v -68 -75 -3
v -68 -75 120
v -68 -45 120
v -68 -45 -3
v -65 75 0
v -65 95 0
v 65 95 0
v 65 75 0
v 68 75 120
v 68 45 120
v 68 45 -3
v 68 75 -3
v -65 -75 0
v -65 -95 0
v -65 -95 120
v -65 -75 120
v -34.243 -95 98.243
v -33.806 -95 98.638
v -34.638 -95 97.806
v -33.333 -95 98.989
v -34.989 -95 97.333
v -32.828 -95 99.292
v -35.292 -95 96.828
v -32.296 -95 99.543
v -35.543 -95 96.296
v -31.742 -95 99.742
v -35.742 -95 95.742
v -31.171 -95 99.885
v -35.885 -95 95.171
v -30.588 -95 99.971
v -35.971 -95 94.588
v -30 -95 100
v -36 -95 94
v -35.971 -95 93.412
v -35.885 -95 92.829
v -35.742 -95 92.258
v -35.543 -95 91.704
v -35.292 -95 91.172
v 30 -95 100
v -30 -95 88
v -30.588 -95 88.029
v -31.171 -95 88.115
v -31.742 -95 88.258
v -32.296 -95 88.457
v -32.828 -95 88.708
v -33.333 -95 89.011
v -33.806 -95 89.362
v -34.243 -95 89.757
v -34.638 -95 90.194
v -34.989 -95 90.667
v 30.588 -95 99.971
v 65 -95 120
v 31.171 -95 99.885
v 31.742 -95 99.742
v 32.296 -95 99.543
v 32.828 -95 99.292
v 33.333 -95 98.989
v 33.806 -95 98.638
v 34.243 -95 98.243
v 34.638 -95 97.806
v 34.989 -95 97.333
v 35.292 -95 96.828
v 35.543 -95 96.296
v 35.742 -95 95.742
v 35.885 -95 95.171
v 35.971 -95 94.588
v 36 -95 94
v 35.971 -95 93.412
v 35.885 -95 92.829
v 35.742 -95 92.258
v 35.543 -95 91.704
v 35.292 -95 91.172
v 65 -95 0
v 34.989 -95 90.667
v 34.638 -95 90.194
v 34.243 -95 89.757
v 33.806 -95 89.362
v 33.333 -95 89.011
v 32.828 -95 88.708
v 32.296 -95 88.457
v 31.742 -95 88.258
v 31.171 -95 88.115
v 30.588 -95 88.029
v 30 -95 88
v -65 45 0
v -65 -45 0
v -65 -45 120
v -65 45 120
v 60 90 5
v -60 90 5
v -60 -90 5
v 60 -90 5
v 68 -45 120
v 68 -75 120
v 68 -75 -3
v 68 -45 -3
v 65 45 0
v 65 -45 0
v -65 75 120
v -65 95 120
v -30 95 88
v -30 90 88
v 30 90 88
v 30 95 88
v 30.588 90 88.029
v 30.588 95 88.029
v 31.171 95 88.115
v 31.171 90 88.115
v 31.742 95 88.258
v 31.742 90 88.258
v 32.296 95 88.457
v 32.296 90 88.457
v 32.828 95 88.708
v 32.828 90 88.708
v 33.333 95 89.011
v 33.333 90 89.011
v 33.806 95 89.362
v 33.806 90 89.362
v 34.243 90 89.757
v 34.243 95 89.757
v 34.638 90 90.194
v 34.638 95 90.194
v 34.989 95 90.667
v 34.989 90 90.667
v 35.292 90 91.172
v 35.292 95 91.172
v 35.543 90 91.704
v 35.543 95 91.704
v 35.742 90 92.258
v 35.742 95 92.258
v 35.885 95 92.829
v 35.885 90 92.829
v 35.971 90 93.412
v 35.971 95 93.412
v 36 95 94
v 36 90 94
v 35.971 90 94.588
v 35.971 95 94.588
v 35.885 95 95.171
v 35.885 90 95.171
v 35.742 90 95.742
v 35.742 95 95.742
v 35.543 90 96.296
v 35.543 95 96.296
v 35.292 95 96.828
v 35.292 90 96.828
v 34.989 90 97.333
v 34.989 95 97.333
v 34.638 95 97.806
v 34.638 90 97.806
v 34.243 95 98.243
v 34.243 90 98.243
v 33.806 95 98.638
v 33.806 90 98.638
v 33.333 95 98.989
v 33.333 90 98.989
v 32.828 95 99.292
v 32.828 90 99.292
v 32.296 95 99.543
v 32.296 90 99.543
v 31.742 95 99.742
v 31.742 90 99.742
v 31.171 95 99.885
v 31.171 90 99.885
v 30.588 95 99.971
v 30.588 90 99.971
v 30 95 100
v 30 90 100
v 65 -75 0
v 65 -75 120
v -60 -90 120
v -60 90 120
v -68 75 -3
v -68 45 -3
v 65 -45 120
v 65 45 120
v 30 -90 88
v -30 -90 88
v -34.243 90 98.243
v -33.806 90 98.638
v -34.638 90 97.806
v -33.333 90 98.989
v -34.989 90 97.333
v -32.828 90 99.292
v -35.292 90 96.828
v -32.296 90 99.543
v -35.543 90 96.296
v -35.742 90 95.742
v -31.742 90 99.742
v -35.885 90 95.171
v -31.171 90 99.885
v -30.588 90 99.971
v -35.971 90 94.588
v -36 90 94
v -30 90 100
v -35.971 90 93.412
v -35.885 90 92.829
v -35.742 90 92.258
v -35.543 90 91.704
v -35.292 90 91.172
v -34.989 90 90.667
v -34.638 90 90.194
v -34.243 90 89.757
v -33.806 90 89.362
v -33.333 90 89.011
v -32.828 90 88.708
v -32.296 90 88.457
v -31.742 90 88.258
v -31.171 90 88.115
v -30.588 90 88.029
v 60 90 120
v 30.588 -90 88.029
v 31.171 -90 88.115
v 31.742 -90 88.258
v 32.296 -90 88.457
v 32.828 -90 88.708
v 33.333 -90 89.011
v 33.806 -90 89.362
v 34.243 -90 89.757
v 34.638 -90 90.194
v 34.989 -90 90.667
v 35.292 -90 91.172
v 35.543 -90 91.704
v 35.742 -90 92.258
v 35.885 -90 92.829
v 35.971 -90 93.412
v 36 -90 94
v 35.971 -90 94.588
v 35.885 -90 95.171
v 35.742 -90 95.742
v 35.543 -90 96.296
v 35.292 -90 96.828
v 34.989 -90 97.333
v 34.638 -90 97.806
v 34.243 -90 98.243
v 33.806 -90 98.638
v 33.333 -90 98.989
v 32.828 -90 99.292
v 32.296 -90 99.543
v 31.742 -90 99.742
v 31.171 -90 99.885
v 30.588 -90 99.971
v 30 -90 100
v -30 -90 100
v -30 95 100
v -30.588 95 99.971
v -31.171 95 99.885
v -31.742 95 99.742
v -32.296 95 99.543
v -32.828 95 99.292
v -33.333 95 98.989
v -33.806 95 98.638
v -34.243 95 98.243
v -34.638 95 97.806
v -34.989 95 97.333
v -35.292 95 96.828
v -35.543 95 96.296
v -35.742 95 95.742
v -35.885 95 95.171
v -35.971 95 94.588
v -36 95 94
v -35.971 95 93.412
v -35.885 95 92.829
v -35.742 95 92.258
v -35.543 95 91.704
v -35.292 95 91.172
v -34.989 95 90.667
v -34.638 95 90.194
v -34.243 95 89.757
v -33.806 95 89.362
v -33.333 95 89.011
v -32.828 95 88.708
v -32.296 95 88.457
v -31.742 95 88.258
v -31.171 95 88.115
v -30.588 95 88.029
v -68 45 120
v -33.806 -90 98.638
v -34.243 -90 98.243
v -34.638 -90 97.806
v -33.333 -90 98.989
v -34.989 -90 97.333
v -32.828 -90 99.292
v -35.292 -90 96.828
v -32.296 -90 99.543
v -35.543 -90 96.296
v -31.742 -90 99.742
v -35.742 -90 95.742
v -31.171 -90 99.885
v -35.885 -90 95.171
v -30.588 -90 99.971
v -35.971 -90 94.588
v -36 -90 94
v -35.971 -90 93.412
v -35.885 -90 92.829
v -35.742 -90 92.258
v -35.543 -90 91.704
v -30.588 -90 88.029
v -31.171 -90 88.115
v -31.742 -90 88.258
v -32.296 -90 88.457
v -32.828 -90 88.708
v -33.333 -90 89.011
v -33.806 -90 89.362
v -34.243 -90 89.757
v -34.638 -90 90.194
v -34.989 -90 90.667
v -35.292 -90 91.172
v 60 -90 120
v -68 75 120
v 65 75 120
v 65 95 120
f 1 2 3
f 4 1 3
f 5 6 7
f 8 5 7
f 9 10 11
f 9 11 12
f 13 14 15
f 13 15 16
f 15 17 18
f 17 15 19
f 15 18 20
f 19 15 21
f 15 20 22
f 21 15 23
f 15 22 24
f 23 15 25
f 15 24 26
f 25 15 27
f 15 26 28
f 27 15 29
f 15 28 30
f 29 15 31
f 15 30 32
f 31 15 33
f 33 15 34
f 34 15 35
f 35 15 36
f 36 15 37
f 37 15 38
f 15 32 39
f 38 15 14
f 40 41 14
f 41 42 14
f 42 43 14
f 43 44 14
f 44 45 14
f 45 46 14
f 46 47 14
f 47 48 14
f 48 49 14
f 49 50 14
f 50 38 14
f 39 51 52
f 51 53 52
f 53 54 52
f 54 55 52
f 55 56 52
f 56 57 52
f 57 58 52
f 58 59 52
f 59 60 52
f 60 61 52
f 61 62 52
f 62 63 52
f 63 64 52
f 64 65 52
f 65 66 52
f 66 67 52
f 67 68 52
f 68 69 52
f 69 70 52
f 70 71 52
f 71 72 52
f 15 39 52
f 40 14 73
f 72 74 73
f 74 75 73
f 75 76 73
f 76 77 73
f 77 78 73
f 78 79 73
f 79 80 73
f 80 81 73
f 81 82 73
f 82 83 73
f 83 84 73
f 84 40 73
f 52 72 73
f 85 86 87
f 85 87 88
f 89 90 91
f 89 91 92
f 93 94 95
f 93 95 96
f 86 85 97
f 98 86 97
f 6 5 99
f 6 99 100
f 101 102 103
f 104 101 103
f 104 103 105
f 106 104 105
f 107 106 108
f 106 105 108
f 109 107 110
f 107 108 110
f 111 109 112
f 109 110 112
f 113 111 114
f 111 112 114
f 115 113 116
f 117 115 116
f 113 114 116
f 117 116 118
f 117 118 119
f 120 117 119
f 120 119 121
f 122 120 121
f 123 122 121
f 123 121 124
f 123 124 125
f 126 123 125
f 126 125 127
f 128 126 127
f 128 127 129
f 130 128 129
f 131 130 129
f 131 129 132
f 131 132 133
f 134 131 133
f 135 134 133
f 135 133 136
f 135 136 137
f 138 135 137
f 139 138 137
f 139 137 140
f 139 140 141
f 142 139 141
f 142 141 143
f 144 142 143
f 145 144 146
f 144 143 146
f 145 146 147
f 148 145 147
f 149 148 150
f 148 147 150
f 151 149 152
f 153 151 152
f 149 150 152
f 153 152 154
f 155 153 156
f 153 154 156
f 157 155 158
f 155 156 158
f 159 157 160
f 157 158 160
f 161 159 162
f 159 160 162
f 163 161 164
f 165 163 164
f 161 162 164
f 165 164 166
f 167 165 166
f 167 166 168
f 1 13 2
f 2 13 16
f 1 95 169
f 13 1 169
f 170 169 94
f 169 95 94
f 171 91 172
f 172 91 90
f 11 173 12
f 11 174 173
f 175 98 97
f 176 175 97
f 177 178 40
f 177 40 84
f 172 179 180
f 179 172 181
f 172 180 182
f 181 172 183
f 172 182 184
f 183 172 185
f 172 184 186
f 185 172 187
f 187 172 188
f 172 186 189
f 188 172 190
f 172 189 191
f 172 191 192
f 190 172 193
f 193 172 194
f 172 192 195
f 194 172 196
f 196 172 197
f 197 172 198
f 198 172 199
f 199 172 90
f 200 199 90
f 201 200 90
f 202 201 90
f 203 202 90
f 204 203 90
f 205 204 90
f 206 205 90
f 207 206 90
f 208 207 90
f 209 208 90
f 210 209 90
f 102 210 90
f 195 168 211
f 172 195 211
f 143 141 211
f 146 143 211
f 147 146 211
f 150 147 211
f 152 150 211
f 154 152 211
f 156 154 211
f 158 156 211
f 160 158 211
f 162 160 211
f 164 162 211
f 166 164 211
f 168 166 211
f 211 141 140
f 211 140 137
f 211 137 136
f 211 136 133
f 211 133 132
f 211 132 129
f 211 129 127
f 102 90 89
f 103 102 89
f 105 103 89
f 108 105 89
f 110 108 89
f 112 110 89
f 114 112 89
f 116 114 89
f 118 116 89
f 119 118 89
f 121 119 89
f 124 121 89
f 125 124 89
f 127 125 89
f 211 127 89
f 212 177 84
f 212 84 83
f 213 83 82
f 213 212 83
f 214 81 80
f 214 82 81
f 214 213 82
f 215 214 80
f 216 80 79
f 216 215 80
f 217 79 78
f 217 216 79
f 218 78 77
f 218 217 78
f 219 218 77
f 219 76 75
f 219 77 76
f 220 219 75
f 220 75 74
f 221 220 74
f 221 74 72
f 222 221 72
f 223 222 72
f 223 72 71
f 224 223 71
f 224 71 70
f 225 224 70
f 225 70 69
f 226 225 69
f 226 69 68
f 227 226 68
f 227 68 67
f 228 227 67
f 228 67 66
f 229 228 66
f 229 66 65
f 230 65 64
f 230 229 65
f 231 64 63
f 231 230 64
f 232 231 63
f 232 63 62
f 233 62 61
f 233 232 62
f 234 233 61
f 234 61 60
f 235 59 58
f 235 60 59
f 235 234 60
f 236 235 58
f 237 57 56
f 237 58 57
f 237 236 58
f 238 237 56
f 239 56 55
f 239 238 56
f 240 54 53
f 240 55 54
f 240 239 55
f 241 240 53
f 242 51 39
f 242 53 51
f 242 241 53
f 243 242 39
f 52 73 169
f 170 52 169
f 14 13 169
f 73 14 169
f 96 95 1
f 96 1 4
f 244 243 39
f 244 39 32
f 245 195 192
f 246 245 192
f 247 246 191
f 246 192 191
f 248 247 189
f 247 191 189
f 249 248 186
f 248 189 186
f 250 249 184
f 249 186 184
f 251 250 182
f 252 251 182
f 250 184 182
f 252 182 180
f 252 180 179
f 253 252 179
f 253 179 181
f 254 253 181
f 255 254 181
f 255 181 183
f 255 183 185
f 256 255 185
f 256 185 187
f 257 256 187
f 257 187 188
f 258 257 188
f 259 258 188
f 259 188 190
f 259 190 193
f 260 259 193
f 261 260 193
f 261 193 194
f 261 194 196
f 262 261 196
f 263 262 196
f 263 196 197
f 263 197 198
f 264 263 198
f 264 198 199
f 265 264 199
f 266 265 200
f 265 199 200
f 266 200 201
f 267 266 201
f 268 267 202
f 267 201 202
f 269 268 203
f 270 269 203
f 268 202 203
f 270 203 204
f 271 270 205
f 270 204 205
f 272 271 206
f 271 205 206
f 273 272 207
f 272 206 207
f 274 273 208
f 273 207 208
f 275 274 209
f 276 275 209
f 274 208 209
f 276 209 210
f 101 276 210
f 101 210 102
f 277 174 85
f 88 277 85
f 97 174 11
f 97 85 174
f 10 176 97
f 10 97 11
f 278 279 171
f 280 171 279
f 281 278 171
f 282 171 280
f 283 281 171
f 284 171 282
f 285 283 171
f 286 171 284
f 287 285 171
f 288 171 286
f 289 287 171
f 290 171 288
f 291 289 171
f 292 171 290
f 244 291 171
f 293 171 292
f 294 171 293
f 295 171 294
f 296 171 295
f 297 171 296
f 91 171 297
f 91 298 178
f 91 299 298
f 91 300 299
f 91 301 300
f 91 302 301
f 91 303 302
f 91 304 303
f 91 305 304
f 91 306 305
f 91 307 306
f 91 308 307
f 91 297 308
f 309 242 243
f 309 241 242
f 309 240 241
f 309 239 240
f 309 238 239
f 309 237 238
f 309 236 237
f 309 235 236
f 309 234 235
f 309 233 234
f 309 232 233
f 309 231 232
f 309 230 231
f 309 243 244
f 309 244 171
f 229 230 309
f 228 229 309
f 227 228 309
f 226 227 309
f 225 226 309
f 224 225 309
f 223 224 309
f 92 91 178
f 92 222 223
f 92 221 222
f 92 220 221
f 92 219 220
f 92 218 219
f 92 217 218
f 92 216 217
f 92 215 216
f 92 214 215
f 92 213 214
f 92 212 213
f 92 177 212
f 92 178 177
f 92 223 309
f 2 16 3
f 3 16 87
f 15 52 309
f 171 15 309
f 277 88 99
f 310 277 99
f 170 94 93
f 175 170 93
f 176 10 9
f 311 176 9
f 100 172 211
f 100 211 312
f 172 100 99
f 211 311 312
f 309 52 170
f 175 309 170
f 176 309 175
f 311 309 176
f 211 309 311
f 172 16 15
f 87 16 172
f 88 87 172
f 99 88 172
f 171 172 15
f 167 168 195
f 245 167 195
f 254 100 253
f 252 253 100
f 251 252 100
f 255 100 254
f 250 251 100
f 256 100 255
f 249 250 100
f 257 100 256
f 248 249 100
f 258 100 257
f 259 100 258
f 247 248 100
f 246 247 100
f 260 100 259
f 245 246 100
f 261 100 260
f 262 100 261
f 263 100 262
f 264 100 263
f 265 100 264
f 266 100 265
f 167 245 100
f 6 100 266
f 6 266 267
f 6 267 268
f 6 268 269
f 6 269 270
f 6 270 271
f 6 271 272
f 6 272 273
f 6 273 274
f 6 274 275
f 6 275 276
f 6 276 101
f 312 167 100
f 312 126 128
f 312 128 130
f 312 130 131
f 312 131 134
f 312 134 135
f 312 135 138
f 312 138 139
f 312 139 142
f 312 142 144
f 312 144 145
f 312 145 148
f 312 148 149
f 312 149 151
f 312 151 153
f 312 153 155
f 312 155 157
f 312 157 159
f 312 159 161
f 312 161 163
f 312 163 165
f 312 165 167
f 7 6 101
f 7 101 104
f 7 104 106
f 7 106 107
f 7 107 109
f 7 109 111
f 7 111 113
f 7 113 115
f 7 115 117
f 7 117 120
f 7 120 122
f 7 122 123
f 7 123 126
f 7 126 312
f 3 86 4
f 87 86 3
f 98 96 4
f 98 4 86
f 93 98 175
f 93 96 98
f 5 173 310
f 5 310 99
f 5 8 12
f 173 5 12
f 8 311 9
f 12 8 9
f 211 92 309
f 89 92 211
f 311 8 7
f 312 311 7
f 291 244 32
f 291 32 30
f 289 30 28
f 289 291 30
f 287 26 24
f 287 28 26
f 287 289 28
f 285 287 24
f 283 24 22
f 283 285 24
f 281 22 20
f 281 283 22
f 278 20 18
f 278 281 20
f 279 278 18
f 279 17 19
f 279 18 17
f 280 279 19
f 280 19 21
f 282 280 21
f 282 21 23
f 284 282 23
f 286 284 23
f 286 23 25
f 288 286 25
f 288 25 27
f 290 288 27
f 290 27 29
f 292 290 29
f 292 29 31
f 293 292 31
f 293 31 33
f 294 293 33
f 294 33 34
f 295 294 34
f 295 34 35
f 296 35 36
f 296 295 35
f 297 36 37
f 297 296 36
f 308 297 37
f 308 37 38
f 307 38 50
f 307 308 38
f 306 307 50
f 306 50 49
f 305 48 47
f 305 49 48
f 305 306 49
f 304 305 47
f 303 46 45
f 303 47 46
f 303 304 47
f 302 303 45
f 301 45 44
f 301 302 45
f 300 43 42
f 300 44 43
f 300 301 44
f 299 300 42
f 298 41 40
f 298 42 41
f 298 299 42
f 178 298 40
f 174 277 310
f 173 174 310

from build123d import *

# Parameters (mm, degrees)
F0_W          = 130
F0_H          = 190
F2_DEPTH      = 120
F3_T          = -5
F5_DEPTH      = 95.001
F5_DEPTH_BACK = 95.001
F6_W          = 130
F6_H          = 30
F7_DEPTH      = 3
F8_W          = 30
F8_H          = 123
F9_DEPTH      = 3


# Not quite as in the source:
# - a pattern or mirror of a feature is missing from the dataset's text; its kind, count and spacing are read off the source's solid


with BuildPart() as f2:
    # F0 (on Top) → F2 (new body, through all)
    with BuildSketch(Plane.XY):
        Rectangle(F0_W, F0_H)
    extrude(amount=F2_DEPTH)

    # F3
    f3_openings = [f2.faces().sort_by_distance(p)[0] for p in [
        (0, 0, 120),
    ]]
    offset(amount=F3_T, openings=f3_openings)

    # F4 (on Front) → F5 (cut, two sides)
    with BuildSketch(Plane.XZ) as f5_sk:
        with BuildLine():
            Line((30, 100), (-30, 100))
            ThreePointArc((-30, 100), (-36, 94), (-30, 88))
            Line((-30, 88), (30, 88))
            ThreePointArc((30, 88), (36, 94), (30, 100))
        make_face()
    extrude(amount=-F5_DEPTH, mode=Mode.SUBTRACT)
    extrude(f5_sk.sketch, amount=F5_DEPTH_BACK, mode=Mode.SUBTRACT)

    # F6 (on face) → F7 (join)
    with BuildSketch(Plane(origin=(0, 0, 0), x_dir=(1, 0, 0), z_dir=(0, 0, -1))):
        with Locations((0, 60)):
            Rectangle(F6_W, F6_H)
        with Locations((0, -60)):
            Rectangle(F6_W, F6_H)
    extrude(amount=F7_DEPTH)

    # F8 (on face) → F9 (join)
    with BuildSketch(Plane.YZ.offset(65)):
        with Locations((-60, 58.5)):
            Rectangle(F8_W, F8_H)
        with Locations((60, 58.5)):
            Rectangle(F8_W, F8_H)
    f9 = extrude(amount=F9_DEPTH)

    # F9_copies: F9 across plane
    add(f9.mirror(Plane(origin=(0, 0, 0), x_dir=(0, 0, -1), z_dir=(-1, 0, 0))))


solid = f2.part
